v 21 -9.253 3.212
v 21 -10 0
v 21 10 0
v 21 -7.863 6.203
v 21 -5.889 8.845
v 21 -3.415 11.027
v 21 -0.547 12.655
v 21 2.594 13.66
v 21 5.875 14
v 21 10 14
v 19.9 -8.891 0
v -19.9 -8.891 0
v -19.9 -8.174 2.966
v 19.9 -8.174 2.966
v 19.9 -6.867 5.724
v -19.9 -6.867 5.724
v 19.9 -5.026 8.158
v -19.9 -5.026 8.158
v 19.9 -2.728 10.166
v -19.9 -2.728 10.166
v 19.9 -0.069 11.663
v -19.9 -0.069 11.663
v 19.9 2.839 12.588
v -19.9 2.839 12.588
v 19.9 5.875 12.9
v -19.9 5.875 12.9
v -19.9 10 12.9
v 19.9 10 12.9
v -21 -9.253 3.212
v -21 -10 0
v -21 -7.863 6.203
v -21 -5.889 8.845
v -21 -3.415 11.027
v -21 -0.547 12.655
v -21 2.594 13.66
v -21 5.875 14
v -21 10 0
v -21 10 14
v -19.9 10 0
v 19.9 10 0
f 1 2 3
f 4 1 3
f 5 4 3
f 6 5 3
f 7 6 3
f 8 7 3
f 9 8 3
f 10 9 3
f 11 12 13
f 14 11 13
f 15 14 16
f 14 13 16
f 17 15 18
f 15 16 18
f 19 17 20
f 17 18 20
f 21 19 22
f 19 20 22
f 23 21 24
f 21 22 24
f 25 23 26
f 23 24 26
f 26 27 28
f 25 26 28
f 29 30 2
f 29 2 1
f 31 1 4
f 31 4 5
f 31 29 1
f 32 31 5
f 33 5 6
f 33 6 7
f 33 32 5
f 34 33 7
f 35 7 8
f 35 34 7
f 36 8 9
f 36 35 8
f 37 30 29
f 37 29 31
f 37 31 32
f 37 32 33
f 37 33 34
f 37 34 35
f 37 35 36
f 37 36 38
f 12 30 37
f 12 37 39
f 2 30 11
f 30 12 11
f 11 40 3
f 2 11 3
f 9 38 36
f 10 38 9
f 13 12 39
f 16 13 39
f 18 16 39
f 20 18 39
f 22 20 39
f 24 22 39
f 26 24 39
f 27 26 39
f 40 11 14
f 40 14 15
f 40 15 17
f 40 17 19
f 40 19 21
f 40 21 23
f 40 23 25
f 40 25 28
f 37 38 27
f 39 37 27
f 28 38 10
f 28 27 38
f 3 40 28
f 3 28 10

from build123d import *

# Parameters (mm, degrees)
F0_W        = 42
F0_H        = 20
F1_DEPTH    = 14
F2_T1_DEPTH = 121.3725393319
F3_T        = -1.1


# Not quite as in the source:
# - a fillet or chamfer that OpenCascade refuses, or shapes differently, is made with other operations: its cross-section is extruded or revolved along the edge and cut away or added


with BuildPart() as f1:
    # F0 (on Top) → F1 (new body)
    with BuildSketch(Plane.XY):
        Rectangle(F0_W, F0_H)
    extrude(amount=F1_DEPTH)

    # F2: fillet of radius 16 on 1 edges, made by hand

    # F2_s2 → F2_t1 (cut)
    with BuildSketch(Plane.YZ.offset(-60.686269666)):
        with BuildLine():
            ThreePointArc((-10, 0), (-4.7084973779, 10), (5.8745078664, 14))
            Line((5.8745078664, 14), (-10, 14))
            Line((-10, 14), (-10, 0))
        make_face()
    extrude(amount=F2_T1_DEPTH, mode=Mode.SUBTRACT)

    # F3
    f3_openings = [f1.faces().sort_by_distance(p)[0] for p in [
        (0, 10, 7),
        (0, 0, 0),
    ]]
    offset(amount=F3_T, openings=f3_openings)


solid = f1.part
